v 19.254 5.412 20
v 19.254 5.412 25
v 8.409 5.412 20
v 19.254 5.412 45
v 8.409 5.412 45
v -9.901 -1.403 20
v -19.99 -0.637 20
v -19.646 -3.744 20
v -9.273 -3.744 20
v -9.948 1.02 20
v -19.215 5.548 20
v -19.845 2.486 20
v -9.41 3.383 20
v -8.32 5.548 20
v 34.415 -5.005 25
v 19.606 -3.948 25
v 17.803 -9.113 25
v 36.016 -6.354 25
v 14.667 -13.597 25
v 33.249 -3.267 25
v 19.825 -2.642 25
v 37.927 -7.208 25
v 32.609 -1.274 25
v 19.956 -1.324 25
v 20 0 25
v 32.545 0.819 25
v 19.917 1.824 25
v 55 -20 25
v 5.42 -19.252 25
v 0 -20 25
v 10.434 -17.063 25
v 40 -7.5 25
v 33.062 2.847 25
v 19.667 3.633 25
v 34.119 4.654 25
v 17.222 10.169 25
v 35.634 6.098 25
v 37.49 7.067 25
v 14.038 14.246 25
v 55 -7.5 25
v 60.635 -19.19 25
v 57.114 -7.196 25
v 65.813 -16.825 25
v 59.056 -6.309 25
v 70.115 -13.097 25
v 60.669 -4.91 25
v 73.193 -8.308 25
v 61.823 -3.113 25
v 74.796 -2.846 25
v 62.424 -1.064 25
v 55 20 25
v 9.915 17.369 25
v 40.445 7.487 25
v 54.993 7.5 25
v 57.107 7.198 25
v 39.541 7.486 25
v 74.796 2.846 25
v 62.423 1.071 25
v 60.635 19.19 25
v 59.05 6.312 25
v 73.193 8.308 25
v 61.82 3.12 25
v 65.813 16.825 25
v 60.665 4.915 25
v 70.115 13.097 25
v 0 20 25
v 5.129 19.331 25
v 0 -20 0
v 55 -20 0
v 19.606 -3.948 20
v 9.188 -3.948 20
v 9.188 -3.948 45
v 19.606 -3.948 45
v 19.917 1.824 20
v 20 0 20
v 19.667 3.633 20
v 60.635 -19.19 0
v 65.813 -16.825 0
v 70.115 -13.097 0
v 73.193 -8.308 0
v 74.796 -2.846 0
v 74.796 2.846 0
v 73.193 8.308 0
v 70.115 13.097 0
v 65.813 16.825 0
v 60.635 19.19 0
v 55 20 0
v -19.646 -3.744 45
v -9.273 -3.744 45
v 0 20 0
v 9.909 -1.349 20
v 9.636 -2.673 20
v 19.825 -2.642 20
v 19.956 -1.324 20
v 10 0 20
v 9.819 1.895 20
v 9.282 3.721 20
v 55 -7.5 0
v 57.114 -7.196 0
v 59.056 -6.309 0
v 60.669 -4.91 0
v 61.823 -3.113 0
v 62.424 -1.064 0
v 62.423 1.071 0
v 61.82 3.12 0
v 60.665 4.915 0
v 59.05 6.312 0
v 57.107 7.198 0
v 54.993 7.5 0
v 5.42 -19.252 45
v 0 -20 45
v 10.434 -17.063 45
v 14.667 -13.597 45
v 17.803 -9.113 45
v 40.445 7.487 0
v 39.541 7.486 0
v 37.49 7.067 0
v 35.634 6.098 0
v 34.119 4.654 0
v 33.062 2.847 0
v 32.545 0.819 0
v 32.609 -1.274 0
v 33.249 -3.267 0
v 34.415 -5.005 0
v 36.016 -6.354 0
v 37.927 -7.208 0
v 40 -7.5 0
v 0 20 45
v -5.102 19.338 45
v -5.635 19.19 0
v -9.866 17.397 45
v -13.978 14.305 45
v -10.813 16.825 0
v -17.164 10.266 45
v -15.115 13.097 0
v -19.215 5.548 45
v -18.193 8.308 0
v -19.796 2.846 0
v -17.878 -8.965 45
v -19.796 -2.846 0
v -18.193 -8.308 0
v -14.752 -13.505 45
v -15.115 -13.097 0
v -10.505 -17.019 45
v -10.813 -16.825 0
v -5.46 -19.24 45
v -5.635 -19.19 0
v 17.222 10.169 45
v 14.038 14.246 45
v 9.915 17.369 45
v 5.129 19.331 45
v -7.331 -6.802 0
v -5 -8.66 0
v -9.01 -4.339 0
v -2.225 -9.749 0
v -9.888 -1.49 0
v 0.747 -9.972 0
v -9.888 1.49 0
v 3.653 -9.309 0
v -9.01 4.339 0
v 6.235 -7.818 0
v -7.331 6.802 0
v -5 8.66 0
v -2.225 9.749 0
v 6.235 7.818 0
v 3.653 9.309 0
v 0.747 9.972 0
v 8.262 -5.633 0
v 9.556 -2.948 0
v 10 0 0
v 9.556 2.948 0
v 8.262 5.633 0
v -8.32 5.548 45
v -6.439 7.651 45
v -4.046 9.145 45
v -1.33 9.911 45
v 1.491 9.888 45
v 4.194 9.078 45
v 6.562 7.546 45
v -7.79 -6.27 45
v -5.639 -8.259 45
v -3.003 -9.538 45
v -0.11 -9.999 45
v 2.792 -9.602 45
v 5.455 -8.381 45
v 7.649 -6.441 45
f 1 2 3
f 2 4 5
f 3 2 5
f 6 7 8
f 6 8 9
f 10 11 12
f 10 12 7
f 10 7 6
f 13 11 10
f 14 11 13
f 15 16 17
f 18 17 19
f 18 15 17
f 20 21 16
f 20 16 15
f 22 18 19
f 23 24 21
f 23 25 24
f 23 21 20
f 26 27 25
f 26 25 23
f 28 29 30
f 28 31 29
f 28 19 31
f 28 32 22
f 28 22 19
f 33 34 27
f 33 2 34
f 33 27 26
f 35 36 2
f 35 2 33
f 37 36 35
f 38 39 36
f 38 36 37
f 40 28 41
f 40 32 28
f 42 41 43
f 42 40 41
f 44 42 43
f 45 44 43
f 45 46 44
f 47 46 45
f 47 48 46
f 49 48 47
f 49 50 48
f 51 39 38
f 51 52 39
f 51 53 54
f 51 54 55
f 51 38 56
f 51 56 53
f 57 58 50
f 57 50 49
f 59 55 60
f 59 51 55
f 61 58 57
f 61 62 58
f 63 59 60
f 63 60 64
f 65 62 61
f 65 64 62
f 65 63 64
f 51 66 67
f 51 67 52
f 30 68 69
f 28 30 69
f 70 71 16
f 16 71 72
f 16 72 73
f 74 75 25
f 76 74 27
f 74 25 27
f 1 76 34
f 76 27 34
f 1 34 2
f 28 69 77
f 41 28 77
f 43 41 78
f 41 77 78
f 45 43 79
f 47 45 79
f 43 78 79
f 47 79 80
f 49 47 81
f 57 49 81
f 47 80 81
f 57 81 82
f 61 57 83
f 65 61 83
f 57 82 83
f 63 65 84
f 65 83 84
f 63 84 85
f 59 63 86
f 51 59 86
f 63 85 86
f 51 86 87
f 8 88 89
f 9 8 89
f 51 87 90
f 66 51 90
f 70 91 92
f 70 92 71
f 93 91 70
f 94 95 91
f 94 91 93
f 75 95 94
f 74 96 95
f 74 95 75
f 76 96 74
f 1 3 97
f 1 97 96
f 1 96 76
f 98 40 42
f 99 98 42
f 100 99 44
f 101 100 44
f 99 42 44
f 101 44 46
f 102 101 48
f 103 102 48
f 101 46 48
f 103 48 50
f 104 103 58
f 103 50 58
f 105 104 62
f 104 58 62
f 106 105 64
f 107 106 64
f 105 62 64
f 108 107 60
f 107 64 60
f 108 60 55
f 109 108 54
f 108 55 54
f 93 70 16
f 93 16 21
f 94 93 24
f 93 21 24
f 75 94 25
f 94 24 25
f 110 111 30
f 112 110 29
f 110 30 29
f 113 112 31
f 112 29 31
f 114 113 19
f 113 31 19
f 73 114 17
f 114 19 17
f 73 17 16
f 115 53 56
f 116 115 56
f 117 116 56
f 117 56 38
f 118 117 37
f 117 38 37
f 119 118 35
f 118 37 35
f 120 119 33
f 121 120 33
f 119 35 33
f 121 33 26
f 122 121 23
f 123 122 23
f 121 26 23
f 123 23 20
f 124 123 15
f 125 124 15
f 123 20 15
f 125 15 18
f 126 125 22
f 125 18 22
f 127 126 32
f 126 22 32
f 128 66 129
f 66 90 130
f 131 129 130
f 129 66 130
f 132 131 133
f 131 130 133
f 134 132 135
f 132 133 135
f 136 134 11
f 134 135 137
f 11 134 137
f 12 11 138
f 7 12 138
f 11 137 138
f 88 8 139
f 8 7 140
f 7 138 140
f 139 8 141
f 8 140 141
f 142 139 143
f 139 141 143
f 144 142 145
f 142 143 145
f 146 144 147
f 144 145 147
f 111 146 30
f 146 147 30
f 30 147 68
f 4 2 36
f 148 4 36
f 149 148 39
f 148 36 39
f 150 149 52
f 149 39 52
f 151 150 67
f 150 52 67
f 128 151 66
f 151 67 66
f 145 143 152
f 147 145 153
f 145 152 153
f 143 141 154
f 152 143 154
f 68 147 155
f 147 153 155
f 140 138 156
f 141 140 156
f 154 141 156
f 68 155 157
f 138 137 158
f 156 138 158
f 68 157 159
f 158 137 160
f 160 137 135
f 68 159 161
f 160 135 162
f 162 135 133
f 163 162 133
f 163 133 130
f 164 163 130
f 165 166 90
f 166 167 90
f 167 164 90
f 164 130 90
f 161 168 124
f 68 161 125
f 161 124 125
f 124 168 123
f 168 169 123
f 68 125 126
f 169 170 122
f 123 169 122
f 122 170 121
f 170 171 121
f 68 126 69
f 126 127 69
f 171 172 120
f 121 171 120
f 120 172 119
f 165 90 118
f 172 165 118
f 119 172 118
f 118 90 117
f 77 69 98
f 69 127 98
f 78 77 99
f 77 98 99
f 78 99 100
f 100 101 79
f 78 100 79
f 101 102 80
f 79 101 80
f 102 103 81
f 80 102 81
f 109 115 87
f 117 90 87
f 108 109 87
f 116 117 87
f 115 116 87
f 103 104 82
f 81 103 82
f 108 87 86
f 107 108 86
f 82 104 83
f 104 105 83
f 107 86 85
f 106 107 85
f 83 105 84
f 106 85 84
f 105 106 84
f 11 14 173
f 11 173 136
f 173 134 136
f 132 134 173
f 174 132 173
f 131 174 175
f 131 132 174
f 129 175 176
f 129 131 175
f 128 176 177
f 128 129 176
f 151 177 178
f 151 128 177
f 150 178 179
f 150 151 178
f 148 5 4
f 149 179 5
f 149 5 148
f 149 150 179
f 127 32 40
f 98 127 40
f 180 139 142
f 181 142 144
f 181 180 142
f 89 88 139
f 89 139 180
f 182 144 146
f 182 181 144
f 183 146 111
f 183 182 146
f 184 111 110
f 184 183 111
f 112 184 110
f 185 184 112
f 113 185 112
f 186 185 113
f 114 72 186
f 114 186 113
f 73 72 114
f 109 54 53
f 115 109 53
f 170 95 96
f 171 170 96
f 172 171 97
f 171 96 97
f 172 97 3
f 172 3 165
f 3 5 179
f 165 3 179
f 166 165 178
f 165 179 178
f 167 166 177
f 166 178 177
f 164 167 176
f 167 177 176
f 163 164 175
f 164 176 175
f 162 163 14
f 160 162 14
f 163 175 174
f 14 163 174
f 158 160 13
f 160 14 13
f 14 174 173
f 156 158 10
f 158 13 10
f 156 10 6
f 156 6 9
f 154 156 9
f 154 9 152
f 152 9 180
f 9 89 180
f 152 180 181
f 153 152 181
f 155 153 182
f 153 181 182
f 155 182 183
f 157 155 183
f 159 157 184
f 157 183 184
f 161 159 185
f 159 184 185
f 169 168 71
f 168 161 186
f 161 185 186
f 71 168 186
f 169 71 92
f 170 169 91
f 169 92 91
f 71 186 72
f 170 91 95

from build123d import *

# Parameters (mm, degrees)
F1_DEPTH = 25
F3_DEPTH = 20
F4_R     = 10
F5_DEPTH = 77.8
F7_DEPTH = 25
F9_DEPTH = 25


# Not quite as in the source:
# - ends of sketch curves that miss each other by under 0.0002 mm in the source are joined


with BuildPart() as f1:
    # F0 (on Top) → F1 (new body)
    with BuildSketch(Plane.XY):
        with BuildLine():
            Line((55, 20), (0, 20))
            ThreePointArc((0, 20), (-20, 0), (0, -20))
            Line((0, -20), (55, -20))
            ThreePointArc((55, -20), (75, 0), (55, 20))
        make_face()
    extrude(amount=F1_DEPTH)

    # F2 (on face) → F3 (join)
    with BuildSketch(Plane.XY.offset(25)):
        with BuildLine():
            ThreePointArc((0, -20), (14.1421356237, -14.1421356237), (20, 0))
            ThreePointArc((20, 0), (14.1421356237, 14.1421356237), (0, 20))
            ThreePointArc((0, 20), (-20, 0), (0, -20))
        make_face()
    extrude(amount=F3_DEPTH)

    # F4 (on face) → F5 (cut)
    with BuildSketch(Plane.XY.offset(45)):
        Circle(F4_R)
    extrude(amount=-F5_DEPTH, mode=Mode.SUBTRACT)

    # F6 (on face) → F7 (cut)
    with BuildSketch(Plane.XY.offset(45)):
        with BuildLine():
            ThreePointArc((-9.2726967228, -3.7439411704), (-9.9478279478, 1.02015642), (-8.3197954675, 5.5480630295))
            Line((-8.3197954675, 5.5480630295), (-19.2150721212, 5.5480630295))
            ThreePointArc((-19.2150721212, 5.5480630295), (-19.9784825468, 0.9274886135), (-19.6464476309, -3.7439411704))
            Line((-19.6464476309, -3.7439411704), (-9.2726967228, -3.7439411704))
        make_face()
        with BuildLine():
            Line((19.2537545525, 5.4122948584), (8.4087492748, 5.4122948584))
            ThreePointArc((8.4087492748, 5.4122948584), (9.593943213, 2.8206831843), (10, 0))
            ThreePointArc((10, 0), (9.7948219983, -2.0153069299), (9.1877075957, -3.94791453))
            Line((9.1877075957, -3.94791453), (19.6064777781, -3.94791453))
            ThreePointArc((19.6064777781, -3.94791453), (19.9013762786, -1.9837394534), (20, 0))
            ThreePointArc((20, 0), (19.8125602971, 2.7317493435), (19.2537545525, 5.4122948584))
        make_face()
    extrude(amount=-F7_DEPTH, mode=Mode.SUBTRACT)

    # F8 (on face) → F9 (cut)
    with BuildSketch(Plane.XY.offset(25)):
        with BuildLine():
            Line((54.9931789181, 7.4999968982), (40.4453485752, 7.4867659671))
            Line((40.4453485752, 7.4867659671), (39.5410340755, 7.485943513))
            ThreePointArc((39.5410340755, 7.485943513), (32.5035149454, -0.229590562), (40, -7.5))
            Line((40, -7.5), (55, -7.5))
            ThreePointArc((55, -7.5), (62.4999992241, 0.0034115228), (54.9931789181, 7.4999968982))
        make_face()
    extrude(amount=-F9_DEPTH, mode=Mode.SUBTRACT)


solid = f1.part
